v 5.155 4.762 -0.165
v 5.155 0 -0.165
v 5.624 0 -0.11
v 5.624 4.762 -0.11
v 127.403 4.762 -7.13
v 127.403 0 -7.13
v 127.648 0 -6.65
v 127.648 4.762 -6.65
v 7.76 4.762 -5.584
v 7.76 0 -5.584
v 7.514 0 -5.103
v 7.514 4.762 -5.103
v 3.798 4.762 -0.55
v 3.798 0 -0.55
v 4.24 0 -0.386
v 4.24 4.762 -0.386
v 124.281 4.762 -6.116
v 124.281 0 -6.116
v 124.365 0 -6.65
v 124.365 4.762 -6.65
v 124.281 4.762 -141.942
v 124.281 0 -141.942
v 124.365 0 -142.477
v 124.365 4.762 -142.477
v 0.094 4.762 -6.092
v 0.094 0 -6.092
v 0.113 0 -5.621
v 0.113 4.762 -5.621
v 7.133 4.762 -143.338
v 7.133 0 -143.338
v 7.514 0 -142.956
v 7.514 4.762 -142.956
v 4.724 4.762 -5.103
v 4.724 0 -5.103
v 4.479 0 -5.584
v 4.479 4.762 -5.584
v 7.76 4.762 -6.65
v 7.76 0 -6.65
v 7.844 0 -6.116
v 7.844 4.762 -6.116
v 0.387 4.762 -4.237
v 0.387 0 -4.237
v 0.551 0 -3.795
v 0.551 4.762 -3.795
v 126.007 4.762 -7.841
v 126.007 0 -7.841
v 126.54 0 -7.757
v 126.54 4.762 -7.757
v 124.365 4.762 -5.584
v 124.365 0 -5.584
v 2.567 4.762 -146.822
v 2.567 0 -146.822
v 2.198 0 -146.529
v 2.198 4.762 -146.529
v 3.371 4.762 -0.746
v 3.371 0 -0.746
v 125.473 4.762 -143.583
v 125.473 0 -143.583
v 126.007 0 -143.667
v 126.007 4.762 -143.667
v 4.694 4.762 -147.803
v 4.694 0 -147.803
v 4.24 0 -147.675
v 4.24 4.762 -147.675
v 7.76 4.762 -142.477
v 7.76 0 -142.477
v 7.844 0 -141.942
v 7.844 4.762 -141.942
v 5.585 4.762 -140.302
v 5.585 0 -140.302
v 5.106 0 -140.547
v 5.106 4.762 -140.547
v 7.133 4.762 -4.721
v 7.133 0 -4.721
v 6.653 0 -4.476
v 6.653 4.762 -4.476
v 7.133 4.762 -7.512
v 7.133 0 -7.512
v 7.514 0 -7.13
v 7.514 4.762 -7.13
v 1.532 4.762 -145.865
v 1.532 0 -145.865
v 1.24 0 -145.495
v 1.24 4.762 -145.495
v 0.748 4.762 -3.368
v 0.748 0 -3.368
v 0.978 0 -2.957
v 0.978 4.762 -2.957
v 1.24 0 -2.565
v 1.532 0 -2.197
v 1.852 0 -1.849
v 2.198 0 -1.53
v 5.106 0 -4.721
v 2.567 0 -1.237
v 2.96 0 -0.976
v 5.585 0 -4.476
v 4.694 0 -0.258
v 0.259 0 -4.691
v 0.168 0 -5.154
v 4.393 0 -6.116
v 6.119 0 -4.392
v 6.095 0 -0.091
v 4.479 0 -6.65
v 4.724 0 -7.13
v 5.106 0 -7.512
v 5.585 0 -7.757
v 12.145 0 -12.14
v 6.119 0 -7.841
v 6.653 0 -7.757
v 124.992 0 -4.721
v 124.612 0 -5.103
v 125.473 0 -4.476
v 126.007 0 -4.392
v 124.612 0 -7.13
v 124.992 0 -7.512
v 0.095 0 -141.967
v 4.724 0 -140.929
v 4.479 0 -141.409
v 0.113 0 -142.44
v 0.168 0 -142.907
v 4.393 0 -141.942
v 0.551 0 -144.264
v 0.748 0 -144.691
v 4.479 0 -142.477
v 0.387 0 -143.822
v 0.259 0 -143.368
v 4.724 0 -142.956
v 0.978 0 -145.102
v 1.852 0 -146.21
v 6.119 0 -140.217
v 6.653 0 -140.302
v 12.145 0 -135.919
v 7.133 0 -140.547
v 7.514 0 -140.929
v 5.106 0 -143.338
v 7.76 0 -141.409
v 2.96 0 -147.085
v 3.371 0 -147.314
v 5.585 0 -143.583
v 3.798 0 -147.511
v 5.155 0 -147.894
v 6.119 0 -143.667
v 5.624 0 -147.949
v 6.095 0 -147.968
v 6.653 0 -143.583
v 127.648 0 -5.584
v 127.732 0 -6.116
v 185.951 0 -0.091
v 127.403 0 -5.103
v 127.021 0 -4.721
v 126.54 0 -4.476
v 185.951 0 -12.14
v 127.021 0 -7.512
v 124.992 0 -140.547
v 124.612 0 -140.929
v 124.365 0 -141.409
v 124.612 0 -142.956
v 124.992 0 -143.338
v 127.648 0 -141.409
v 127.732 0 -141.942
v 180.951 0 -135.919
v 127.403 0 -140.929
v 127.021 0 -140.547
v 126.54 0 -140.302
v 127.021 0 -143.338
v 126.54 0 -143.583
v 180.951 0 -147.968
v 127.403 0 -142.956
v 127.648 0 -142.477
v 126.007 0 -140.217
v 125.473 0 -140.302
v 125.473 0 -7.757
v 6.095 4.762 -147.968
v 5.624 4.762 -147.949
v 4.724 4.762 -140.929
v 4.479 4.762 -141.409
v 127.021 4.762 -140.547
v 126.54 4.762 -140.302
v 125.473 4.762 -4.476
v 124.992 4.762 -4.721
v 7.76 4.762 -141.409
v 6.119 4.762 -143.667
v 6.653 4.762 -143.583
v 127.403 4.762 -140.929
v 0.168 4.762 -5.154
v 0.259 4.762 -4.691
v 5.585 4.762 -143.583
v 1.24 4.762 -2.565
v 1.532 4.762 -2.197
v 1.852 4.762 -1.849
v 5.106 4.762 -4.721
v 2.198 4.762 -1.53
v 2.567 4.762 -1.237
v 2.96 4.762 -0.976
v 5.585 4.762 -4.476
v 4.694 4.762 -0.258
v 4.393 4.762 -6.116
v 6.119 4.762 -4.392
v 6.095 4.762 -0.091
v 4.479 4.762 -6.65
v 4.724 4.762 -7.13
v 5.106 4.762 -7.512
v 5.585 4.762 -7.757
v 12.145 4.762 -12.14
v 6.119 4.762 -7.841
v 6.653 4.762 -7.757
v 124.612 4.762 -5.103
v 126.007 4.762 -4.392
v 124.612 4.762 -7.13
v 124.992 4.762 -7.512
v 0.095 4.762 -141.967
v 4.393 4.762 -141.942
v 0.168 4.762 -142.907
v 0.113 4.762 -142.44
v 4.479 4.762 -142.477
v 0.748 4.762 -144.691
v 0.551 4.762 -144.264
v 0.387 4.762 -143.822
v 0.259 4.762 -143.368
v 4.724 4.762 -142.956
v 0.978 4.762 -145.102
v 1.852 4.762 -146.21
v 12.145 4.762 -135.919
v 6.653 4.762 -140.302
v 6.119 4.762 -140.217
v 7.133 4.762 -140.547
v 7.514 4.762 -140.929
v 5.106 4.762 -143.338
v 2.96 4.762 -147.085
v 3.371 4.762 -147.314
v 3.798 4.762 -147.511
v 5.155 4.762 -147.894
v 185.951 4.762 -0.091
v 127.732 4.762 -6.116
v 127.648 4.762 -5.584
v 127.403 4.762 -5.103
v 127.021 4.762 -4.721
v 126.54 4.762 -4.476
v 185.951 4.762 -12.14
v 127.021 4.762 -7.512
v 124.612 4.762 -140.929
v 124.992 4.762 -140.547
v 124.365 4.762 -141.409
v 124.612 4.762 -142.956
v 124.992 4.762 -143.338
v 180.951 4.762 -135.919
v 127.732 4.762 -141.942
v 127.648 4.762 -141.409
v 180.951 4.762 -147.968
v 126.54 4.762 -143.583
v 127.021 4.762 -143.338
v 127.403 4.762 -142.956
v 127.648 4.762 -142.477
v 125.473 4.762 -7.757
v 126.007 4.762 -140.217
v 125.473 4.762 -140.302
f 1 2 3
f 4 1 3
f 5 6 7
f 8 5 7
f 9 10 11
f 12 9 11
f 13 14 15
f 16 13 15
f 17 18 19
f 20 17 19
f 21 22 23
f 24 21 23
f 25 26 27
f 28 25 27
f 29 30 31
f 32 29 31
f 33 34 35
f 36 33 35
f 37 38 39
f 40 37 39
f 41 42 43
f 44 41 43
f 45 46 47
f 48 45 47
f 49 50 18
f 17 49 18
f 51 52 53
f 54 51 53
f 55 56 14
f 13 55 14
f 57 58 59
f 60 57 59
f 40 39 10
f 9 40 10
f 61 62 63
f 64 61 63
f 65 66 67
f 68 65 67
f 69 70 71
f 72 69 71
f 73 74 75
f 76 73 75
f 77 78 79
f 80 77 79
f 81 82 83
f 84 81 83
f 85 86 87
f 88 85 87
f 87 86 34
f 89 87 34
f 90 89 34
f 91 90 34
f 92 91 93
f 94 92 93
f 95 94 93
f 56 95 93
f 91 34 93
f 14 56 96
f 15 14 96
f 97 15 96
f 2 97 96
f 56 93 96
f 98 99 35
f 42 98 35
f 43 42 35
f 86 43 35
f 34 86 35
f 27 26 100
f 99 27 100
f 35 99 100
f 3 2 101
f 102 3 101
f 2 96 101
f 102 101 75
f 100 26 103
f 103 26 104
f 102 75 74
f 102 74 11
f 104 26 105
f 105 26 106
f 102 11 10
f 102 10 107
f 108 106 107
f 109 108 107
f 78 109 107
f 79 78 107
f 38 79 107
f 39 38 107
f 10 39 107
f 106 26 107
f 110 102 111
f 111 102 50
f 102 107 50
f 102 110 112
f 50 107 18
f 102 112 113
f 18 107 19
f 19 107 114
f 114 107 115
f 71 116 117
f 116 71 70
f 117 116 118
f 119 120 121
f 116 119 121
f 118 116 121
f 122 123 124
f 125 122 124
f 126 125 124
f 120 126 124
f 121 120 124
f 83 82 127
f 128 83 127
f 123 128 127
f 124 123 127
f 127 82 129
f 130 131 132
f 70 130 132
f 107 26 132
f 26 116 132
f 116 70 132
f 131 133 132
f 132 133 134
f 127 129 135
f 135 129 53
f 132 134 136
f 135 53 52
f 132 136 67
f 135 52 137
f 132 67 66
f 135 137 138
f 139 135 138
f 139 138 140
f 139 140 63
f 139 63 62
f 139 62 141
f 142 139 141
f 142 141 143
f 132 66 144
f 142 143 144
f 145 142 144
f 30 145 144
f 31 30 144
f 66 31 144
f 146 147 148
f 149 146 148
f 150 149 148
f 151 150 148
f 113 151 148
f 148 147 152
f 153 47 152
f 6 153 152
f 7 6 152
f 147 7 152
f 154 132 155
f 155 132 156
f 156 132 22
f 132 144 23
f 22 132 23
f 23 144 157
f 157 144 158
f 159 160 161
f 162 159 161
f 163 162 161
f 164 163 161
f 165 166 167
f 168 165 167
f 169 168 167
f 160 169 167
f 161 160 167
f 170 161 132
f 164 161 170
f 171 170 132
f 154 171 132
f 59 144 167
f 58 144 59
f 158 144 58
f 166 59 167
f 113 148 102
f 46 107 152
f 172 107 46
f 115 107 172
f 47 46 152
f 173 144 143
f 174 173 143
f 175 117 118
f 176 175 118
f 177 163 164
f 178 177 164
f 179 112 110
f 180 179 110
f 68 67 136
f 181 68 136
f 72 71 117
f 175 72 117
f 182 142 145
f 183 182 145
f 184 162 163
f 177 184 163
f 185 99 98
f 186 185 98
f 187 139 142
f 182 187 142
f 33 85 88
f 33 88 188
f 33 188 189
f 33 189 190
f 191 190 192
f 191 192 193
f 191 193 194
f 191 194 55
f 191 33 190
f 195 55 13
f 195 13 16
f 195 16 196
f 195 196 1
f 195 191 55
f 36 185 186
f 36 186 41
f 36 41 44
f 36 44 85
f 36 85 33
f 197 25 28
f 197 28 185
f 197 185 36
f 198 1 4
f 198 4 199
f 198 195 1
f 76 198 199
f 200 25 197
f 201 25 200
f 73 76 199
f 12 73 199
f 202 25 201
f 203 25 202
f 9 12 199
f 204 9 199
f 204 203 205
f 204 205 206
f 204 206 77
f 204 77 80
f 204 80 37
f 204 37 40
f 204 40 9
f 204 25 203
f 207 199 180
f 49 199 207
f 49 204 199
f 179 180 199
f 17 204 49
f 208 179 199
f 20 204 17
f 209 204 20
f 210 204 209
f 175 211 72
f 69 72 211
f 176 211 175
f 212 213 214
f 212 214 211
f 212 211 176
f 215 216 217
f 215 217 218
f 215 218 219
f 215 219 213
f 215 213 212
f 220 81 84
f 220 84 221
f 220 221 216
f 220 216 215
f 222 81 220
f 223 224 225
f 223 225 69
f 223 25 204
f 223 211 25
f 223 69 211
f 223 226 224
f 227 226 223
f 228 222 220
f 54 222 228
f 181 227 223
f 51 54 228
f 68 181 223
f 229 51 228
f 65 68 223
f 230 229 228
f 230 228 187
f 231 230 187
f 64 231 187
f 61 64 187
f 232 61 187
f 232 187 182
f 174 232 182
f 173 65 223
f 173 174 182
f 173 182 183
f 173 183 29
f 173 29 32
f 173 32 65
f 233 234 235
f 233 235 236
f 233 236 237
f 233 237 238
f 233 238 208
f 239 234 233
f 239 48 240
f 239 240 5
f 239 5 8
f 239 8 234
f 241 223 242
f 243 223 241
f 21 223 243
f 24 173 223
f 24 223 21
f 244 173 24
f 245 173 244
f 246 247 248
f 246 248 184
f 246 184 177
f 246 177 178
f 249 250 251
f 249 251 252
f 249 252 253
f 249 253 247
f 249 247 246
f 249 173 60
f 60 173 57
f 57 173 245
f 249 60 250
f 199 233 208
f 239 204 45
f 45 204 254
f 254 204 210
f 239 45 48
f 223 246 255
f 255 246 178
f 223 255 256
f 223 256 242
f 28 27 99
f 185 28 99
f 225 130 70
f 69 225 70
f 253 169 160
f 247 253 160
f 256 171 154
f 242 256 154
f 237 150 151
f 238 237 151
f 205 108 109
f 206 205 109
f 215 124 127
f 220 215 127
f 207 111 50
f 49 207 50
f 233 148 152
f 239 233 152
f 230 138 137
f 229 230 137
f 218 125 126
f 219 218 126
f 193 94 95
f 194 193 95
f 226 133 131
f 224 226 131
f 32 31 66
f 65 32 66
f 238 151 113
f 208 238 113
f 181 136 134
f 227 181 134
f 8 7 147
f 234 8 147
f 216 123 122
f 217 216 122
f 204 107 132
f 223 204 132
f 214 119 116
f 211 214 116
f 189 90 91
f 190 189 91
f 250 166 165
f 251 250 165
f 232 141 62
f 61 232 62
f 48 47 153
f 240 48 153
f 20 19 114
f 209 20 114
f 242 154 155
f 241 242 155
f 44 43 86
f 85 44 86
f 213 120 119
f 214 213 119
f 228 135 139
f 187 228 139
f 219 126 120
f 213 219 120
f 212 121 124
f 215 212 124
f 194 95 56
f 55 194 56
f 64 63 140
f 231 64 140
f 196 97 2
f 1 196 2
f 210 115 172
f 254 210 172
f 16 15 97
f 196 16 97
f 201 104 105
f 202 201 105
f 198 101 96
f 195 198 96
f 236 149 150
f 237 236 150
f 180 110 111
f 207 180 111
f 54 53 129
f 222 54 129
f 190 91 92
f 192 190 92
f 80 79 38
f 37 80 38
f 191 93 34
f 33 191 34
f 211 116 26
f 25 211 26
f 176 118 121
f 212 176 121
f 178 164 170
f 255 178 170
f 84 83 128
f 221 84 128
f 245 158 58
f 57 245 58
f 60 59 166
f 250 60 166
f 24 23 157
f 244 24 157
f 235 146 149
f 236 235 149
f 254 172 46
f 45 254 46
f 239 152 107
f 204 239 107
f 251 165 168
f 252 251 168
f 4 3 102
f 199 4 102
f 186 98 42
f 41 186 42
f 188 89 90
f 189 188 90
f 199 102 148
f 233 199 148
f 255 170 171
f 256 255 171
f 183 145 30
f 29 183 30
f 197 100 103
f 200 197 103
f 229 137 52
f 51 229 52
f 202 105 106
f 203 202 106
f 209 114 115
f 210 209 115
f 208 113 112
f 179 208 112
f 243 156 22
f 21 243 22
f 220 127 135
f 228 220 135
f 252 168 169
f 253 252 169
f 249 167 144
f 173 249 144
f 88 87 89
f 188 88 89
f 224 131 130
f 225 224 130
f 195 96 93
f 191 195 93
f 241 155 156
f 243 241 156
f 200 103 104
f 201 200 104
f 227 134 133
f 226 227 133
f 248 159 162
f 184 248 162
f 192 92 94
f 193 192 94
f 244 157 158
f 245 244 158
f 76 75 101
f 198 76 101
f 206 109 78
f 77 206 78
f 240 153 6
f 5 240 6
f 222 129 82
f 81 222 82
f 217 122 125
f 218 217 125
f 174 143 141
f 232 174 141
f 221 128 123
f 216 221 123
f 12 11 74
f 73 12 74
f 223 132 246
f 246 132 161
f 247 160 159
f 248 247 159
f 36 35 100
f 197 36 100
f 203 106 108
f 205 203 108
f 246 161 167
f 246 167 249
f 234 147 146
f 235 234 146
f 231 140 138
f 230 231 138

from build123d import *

# Parameters (mm, degrees)
BOSS_EXTRUDE2_DEPTH = 4.7625
CUT_EXTRUDE2_DEPTH  = 4.7625
SKETCH3_W           = 5
SKETCH3_H           = 4.7625
CUT_EXTRUDE3_DEPTH  = 4.7625


with BuildPart() as part:
    # Sketch1 → Boss-Extrude2 (new body)
    with BuildSketch(Plane(origin=(0, 0, 0), x_dir=(1, 0, 0), z_dir=(0, 1, 0))):
        Polygon((185.950525, 135.919), (185.950525, 147.9675), (6.09505, 147.968), (5.62377, 147.949), (5.15525, 147.894), (4.6936, 147.803), (4.24021, 147.675), (3.79786, 147.511), (3.37068, 147.314), (2.96003, 147.085), (2.56728, 146.822), (2.19797, 146.529), (1.85208, 146.21), (1.53238, 145.865), (1.24024, 145.495), (0.978408, 145.102), (0.748273, 144.691), (0.551215, 144.264), (0.38723, 143.822), (0.259071, 143.368), (0.168121, 142.907), (0.112999, 142.44), (0.0950846, 141.967), (0.0937066, 6.0923), (0.112999, 5.62102), (0.168121, 5.15387), (0.259071, 4.69085), (0.38723, 4.23746), (0.551215, 3.79511), (0.748273, 3.36793), (0.978408, 2.95727), (1.24024, 2.56453), (1.53238, 2.19659), (1.85208, 1.84933), (2.19797, 1.52962), (2.56728, 1.23748), (2.96003, 0.975653), (3.37068, 0.745518), (3.79786, 0.549836), (4.24021, 0.385851), (4.6936, 0.257693), (5.15525, 0.165365), (5.62377, 0.110243), (6.09505, 0.0909507), (185.950525, 0.0909507), (185.950525, 12.1405), (12.1447, 12.1405), (12.1447, 135.919), align=None)
        Polygon((5.10565, 7.5117), (5.58518, 7.75698), (6.11851, 7.84105), (6.65318, 7.75698), (7.13274, 7.5117), (7.51445, 7.12996), (7.75974, 6.65043), (7.8438, 6.11572), (7.75974, 5.5838), (7.51445, 5.10286), (7.13274, 4.72115), (6.65318, 4.47587), (6.11851, 4.3918), (5.58518, 4.47587), (5.10565, 4.72115), (4.72391, 5.10286), (4.47862, 5.5838), (4.39318, 6.11572), (4.47862, 6.65043), (4.72391, 7.12996), align=None, mode=Mode.SUBTRACT)
        Polygon((124.992, 7.5117), (125.473, 7.75698), (126.007, 7.84105), (126.54, 7.75698), (127.021, 7.5117), (127.403, 7.12996), (127.648, 6.65043), (127.732, 6.11572), (127.648, 5.5838), (127.403, 5.10286), (127.021, 4.72115), (126.54, 4.47587), (126.007, 4.3918), (125.473, 4.47587), (124.992, 4.72115), (124.612, 5.10286), (124.365, 5.5838), (124.281, 6.11572), (124.365, 6.65043), (124.612, 7.12996), align=None, mode=Mode.SUBTRACT)
        Polygon((5.10565, 143.338), (5.58518, 143.583), (6.11851, 143.667), (6.65318, 143.583), (7.13274, 143.338), (7.51445, 142.956), (7.75974, 142.477), (7.8438, 141.942), (7.75974, 141.409), (7.51445, 140.929), (7.13274, 140.547), (6.65318, 140.302), (6.11851, 140.217), (5.58518, 140.302), (5.10565, 140.547), (4.72391, 140.929), (4.47862, 141.409), (4.39318, 141.942), (4.47862, 142.477), (4.72391, 142.956), align=None, mode=Mode.SUBTRACT)
        Polygon((124.992, 143.338), (125.473, 143.583), (126.007, 143.667), (126.54, 143.583), (127.021, 143.338), (127.403, 142.956), (127.648, 142.477), (127.732, 141.942), (127.648, 141.409), (127.403, 140.929), (127.021, 140.547), (126.54, 140.302), (126.007, 140.217), (125.473, 140.302), (124.992, 140.547), (124.612, 140.929), (124.365, 141.409), (124.281, 141.942), (124.365, 142.477), (124.612, 142.956), align=None, mode=Mode.SUBTRACT)
    extrude(amount=BOSS_EXTRUDE2_DEPTH)

    # Sketch2 → Cut-Extrude2 (cut)
    with BuildSketch(Plane(origin=(0, 4.7625, 0), x_dir=(1, 0, 0), z_dir=(0, 1, 0))):
        Polygon((180.950525, 141.94325), (180.950525, 147.9675), (185.950525, 147.9675), (185.950525, 141.94325), (185.950525, 135.919), (180.950525, 135.919), align=None)
    extrude(amount=-CUT_EXTRUDE2_DEPTH, mode=Mode.SUBTRACT)

    # Sketch3 → Cut-Extrude3 (cut)
    with BuildSketch(Plane.XY.offset(-147.9675)):
        with Locations((183.450525, 2.38125)):
            Rectangle(SKETCH3_W, SKETCH3_H)
    extrude(amount=-CUT_EXTRUDE3_DEPTH, mode=Mode.SUBTRACT)


solid = part.part
